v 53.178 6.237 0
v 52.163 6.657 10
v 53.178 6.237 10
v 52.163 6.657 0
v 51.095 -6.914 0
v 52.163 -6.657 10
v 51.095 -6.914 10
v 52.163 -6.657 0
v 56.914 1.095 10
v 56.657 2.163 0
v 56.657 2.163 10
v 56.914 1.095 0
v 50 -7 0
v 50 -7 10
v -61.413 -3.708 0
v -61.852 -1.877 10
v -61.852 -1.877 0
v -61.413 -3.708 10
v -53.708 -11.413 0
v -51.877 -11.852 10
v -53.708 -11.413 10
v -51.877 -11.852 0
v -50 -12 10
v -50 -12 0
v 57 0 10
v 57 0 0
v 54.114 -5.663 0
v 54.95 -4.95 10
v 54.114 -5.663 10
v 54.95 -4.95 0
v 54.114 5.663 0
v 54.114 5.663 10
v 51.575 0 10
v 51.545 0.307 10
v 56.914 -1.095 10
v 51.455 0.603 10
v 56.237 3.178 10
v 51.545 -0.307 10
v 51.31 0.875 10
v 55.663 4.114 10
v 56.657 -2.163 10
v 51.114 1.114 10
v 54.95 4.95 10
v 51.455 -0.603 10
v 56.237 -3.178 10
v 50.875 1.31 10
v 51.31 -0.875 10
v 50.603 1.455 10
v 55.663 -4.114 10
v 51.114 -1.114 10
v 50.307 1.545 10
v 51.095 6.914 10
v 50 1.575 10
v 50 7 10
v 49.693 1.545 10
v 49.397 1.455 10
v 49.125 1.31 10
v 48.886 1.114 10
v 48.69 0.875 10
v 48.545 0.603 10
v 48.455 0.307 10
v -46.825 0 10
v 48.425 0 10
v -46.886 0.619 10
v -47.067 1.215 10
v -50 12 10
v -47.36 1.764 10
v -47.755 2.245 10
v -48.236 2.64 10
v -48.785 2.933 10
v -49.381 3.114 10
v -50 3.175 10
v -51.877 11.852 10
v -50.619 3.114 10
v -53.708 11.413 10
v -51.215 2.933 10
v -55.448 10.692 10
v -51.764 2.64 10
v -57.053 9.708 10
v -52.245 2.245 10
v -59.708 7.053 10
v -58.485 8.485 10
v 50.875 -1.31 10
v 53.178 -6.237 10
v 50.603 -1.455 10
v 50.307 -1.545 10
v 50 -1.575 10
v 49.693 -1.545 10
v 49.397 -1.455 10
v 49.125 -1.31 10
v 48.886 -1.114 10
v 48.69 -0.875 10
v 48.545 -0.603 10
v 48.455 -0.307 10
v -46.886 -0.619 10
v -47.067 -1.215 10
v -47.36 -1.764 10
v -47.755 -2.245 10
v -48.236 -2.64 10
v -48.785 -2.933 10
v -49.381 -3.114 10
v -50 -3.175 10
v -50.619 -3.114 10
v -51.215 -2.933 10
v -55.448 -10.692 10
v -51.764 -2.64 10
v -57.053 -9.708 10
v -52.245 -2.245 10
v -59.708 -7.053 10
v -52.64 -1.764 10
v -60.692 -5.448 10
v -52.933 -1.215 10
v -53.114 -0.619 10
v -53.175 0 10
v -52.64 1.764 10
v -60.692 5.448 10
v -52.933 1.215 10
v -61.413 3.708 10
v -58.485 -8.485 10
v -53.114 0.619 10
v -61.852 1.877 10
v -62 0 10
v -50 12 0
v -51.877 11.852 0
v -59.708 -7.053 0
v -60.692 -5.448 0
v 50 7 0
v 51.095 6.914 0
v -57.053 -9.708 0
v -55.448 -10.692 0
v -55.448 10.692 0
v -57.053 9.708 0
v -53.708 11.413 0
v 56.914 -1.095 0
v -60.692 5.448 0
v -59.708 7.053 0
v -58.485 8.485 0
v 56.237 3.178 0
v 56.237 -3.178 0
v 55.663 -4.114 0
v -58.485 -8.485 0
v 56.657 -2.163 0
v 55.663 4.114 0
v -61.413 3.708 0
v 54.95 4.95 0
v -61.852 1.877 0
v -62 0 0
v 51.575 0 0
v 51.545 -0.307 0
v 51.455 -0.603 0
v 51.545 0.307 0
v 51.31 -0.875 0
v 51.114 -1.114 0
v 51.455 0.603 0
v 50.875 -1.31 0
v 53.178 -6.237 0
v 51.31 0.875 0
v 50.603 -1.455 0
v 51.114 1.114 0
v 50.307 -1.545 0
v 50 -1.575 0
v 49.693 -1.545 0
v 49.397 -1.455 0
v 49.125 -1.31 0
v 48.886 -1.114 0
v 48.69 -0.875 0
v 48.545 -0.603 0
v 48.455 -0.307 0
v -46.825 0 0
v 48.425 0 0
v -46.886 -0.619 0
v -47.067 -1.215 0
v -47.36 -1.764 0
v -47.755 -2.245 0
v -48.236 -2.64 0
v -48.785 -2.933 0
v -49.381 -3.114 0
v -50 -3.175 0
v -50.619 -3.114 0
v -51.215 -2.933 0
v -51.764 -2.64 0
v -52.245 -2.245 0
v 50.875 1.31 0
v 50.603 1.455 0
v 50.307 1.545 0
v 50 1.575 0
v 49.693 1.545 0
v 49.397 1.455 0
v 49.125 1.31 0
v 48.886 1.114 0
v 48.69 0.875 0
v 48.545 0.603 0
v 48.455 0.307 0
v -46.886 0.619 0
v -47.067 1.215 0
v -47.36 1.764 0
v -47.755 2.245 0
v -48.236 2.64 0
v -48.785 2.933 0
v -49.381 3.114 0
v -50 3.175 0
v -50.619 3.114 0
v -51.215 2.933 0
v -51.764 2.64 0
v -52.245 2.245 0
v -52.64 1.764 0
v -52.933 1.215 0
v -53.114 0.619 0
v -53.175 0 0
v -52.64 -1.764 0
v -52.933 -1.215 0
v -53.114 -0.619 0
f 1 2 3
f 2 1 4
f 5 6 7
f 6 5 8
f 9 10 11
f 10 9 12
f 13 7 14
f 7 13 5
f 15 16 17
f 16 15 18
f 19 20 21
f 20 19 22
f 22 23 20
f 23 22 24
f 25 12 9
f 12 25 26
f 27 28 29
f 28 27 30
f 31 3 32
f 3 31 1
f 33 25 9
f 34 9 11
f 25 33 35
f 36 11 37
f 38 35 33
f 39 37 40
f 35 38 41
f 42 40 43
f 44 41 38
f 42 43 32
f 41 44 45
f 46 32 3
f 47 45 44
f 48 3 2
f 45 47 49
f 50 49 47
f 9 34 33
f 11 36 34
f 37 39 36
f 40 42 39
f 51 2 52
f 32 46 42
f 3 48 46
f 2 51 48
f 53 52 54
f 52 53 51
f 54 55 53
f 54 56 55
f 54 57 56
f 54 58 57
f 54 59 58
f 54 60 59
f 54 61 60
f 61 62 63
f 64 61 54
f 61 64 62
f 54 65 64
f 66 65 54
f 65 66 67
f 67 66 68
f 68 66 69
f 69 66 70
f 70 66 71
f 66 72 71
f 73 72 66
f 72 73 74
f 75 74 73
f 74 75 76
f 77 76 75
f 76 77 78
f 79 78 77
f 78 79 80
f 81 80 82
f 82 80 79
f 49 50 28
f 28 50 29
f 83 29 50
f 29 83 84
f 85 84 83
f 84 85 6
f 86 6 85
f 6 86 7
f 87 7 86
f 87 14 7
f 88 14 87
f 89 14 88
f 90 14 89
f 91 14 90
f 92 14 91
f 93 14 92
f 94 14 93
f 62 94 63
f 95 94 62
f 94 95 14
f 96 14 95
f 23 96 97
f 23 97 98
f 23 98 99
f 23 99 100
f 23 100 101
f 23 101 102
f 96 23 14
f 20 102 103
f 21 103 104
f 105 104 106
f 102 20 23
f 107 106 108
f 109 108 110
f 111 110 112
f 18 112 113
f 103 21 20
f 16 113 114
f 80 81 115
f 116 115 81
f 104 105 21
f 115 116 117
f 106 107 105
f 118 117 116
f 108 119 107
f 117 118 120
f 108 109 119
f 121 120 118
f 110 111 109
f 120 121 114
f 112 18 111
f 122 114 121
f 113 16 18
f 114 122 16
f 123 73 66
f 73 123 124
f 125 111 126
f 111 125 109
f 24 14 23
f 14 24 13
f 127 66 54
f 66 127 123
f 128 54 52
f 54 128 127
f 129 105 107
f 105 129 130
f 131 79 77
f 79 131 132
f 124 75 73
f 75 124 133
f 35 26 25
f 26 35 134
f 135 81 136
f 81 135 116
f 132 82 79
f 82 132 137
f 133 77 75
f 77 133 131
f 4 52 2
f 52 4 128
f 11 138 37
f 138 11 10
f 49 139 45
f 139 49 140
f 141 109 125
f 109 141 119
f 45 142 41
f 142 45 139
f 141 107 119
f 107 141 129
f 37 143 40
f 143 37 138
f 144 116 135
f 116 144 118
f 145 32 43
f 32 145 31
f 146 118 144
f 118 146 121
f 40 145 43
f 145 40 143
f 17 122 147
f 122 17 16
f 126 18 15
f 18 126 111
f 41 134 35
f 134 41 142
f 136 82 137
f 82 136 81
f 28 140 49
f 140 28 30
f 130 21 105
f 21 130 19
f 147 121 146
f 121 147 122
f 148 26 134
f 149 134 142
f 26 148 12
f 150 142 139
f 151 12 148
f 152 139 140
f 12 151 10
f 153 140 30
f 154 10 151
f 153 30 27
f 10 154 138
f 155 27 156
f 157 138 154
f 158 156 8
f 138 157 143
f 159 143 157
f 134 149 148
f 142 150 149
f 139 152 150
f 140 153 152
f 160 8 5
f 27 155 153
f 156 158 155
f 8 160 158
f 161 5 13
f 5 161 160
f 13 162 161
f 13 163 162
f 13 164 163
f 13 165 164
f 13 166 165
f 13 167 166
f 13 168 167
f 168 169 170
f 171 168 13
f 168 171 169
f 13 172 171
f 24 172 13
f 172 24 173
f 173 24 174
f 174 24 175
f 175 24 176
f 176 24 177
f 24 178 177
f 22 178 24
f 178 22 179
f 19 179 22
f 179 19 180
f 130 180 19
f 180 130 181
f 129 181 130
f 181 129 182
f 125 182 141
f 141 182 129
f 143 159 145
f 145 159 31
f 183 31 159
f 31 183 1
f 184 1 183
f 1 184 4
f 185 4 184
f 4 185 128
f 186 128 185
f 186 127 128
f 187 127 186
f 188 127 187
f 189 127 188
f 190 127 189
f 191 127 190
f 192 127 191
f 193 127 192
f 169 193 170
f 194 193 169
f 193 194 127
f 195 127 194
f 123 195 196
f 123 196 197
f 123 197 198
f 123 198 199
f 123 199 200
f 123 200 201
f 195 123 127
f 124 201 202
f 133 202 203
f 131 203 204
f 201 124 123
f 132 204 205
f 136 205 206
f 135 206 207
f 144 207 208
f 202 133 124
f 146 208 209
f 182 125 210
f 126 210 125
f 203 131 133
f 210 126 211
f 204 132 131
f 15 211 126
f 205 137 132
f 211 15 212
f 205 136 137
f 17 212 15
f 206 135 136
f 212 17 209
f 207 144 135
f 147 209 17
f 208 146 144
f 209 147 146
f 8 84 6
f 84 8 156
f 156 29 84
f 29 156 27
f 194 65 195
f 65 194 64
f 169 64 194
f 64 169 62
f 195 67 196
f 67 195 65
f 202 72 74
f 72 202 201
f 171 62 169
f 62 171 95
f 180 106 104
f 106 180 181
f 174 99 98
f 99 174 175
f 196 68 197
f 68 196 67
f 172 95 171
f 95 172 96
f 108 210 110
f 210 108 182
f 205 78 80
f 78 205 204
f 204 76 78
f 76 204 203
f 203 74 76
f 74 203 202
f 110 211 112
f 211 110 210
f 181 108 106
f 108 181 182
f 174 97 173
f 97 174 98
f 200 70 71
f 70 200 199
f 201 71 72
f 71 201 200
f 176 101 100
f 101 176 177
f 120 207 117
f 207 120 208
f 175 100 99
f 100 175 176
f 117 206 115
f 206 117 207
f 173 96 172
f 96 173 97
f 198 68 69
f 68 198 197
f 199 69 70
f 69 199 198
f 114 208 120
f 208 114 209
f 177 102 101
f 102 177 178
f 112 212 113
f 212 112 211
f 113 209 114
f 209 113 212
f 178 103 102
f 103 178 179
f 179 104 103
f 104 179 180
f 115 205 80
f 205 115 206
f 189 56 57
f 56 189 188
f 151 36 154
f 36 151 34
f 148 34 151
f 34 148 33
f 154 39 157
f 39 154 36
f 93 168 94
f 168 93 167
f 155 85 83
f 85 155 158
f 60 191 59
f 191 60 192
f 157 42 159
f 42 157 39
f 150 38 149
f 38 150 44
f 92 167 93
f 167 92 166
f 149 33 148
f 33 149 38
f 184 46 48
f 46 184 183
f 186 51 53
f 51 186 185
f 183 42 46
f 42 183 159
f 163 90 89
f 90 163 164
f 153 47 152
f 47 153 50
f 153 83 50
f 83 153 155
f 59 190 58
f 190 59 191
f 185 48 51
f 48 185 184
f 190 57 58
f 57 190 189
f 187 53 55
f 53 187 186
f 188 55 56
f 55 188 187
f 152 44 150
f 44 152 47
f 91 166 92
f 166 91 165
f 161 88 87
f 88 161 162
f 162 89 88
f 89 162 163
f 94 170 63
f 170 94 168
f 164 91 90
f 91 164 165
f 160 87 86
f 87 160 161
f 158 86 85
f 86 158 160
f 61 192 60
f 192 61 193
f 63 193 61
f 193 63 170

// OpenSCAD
$fn = 32;

// ----------------------------------------------------------------------
// Lever: 100 mm between the bosses, 10 mm thick, smooth outline
// ----------------------------------------------------------------------

// --- parameters (mm) ---
lever_l = 100;            // distance between the boss centres
boss_a = 24;              // first boss diameter
boss_b = 14;              // second boss diameter
bore_a = 6.35;            // first bore
bore_b = 3.15;            // second bore
lever_t = 10;             // lever thickness

lever_profile = [[-62, 0], [-61.852, -1.877], [-61.413, -3.708], [-60.692, -5.448], [-59.708, -7.053], [-58.485, -8.485], [-57.053, -9.708], [-55.448, -10.692], [-53.708, -11.413], [-51.877, -11.852], [-50, -12], [50, -7], [51.095, -6.914], [52.163, -6.657], [53.178, -6.237], [54.114, -5.663], [54.95, -4.95], [55.663, -4.114], [56.237, -3.178], [56.657, -2.163], [56.914, -1.095], [57, 0], [56.914, 1.095], [56.657, 2.163], [56.237, 3.178], [55.663, 4.114], [54.95, 4.95], [54.114, 5.663], [53.178, 6.237], [52.163, 6.657], [51.095, 6.914], [50, 7], [-50, 12], [-51.877, 11.852], [-53.708, 11.413], [-55.448, 10.692], [-57.053, 9.708], [-58.485, 8.485], [-59.708, 7.053], [-60.692, 5.448], [-61.413, 3.708], [-61.852, 1.877]];

difference() {
  linear_extrude(height = lever_t) polygon(lever_profile);
  translate([-50, 0, -2.5]) cylinder(h = lever_t + 5, d = bore_a);
  translate([50, 0, -2.5]) cylinder(h = lever_t + 5, d = bore_b);
}
